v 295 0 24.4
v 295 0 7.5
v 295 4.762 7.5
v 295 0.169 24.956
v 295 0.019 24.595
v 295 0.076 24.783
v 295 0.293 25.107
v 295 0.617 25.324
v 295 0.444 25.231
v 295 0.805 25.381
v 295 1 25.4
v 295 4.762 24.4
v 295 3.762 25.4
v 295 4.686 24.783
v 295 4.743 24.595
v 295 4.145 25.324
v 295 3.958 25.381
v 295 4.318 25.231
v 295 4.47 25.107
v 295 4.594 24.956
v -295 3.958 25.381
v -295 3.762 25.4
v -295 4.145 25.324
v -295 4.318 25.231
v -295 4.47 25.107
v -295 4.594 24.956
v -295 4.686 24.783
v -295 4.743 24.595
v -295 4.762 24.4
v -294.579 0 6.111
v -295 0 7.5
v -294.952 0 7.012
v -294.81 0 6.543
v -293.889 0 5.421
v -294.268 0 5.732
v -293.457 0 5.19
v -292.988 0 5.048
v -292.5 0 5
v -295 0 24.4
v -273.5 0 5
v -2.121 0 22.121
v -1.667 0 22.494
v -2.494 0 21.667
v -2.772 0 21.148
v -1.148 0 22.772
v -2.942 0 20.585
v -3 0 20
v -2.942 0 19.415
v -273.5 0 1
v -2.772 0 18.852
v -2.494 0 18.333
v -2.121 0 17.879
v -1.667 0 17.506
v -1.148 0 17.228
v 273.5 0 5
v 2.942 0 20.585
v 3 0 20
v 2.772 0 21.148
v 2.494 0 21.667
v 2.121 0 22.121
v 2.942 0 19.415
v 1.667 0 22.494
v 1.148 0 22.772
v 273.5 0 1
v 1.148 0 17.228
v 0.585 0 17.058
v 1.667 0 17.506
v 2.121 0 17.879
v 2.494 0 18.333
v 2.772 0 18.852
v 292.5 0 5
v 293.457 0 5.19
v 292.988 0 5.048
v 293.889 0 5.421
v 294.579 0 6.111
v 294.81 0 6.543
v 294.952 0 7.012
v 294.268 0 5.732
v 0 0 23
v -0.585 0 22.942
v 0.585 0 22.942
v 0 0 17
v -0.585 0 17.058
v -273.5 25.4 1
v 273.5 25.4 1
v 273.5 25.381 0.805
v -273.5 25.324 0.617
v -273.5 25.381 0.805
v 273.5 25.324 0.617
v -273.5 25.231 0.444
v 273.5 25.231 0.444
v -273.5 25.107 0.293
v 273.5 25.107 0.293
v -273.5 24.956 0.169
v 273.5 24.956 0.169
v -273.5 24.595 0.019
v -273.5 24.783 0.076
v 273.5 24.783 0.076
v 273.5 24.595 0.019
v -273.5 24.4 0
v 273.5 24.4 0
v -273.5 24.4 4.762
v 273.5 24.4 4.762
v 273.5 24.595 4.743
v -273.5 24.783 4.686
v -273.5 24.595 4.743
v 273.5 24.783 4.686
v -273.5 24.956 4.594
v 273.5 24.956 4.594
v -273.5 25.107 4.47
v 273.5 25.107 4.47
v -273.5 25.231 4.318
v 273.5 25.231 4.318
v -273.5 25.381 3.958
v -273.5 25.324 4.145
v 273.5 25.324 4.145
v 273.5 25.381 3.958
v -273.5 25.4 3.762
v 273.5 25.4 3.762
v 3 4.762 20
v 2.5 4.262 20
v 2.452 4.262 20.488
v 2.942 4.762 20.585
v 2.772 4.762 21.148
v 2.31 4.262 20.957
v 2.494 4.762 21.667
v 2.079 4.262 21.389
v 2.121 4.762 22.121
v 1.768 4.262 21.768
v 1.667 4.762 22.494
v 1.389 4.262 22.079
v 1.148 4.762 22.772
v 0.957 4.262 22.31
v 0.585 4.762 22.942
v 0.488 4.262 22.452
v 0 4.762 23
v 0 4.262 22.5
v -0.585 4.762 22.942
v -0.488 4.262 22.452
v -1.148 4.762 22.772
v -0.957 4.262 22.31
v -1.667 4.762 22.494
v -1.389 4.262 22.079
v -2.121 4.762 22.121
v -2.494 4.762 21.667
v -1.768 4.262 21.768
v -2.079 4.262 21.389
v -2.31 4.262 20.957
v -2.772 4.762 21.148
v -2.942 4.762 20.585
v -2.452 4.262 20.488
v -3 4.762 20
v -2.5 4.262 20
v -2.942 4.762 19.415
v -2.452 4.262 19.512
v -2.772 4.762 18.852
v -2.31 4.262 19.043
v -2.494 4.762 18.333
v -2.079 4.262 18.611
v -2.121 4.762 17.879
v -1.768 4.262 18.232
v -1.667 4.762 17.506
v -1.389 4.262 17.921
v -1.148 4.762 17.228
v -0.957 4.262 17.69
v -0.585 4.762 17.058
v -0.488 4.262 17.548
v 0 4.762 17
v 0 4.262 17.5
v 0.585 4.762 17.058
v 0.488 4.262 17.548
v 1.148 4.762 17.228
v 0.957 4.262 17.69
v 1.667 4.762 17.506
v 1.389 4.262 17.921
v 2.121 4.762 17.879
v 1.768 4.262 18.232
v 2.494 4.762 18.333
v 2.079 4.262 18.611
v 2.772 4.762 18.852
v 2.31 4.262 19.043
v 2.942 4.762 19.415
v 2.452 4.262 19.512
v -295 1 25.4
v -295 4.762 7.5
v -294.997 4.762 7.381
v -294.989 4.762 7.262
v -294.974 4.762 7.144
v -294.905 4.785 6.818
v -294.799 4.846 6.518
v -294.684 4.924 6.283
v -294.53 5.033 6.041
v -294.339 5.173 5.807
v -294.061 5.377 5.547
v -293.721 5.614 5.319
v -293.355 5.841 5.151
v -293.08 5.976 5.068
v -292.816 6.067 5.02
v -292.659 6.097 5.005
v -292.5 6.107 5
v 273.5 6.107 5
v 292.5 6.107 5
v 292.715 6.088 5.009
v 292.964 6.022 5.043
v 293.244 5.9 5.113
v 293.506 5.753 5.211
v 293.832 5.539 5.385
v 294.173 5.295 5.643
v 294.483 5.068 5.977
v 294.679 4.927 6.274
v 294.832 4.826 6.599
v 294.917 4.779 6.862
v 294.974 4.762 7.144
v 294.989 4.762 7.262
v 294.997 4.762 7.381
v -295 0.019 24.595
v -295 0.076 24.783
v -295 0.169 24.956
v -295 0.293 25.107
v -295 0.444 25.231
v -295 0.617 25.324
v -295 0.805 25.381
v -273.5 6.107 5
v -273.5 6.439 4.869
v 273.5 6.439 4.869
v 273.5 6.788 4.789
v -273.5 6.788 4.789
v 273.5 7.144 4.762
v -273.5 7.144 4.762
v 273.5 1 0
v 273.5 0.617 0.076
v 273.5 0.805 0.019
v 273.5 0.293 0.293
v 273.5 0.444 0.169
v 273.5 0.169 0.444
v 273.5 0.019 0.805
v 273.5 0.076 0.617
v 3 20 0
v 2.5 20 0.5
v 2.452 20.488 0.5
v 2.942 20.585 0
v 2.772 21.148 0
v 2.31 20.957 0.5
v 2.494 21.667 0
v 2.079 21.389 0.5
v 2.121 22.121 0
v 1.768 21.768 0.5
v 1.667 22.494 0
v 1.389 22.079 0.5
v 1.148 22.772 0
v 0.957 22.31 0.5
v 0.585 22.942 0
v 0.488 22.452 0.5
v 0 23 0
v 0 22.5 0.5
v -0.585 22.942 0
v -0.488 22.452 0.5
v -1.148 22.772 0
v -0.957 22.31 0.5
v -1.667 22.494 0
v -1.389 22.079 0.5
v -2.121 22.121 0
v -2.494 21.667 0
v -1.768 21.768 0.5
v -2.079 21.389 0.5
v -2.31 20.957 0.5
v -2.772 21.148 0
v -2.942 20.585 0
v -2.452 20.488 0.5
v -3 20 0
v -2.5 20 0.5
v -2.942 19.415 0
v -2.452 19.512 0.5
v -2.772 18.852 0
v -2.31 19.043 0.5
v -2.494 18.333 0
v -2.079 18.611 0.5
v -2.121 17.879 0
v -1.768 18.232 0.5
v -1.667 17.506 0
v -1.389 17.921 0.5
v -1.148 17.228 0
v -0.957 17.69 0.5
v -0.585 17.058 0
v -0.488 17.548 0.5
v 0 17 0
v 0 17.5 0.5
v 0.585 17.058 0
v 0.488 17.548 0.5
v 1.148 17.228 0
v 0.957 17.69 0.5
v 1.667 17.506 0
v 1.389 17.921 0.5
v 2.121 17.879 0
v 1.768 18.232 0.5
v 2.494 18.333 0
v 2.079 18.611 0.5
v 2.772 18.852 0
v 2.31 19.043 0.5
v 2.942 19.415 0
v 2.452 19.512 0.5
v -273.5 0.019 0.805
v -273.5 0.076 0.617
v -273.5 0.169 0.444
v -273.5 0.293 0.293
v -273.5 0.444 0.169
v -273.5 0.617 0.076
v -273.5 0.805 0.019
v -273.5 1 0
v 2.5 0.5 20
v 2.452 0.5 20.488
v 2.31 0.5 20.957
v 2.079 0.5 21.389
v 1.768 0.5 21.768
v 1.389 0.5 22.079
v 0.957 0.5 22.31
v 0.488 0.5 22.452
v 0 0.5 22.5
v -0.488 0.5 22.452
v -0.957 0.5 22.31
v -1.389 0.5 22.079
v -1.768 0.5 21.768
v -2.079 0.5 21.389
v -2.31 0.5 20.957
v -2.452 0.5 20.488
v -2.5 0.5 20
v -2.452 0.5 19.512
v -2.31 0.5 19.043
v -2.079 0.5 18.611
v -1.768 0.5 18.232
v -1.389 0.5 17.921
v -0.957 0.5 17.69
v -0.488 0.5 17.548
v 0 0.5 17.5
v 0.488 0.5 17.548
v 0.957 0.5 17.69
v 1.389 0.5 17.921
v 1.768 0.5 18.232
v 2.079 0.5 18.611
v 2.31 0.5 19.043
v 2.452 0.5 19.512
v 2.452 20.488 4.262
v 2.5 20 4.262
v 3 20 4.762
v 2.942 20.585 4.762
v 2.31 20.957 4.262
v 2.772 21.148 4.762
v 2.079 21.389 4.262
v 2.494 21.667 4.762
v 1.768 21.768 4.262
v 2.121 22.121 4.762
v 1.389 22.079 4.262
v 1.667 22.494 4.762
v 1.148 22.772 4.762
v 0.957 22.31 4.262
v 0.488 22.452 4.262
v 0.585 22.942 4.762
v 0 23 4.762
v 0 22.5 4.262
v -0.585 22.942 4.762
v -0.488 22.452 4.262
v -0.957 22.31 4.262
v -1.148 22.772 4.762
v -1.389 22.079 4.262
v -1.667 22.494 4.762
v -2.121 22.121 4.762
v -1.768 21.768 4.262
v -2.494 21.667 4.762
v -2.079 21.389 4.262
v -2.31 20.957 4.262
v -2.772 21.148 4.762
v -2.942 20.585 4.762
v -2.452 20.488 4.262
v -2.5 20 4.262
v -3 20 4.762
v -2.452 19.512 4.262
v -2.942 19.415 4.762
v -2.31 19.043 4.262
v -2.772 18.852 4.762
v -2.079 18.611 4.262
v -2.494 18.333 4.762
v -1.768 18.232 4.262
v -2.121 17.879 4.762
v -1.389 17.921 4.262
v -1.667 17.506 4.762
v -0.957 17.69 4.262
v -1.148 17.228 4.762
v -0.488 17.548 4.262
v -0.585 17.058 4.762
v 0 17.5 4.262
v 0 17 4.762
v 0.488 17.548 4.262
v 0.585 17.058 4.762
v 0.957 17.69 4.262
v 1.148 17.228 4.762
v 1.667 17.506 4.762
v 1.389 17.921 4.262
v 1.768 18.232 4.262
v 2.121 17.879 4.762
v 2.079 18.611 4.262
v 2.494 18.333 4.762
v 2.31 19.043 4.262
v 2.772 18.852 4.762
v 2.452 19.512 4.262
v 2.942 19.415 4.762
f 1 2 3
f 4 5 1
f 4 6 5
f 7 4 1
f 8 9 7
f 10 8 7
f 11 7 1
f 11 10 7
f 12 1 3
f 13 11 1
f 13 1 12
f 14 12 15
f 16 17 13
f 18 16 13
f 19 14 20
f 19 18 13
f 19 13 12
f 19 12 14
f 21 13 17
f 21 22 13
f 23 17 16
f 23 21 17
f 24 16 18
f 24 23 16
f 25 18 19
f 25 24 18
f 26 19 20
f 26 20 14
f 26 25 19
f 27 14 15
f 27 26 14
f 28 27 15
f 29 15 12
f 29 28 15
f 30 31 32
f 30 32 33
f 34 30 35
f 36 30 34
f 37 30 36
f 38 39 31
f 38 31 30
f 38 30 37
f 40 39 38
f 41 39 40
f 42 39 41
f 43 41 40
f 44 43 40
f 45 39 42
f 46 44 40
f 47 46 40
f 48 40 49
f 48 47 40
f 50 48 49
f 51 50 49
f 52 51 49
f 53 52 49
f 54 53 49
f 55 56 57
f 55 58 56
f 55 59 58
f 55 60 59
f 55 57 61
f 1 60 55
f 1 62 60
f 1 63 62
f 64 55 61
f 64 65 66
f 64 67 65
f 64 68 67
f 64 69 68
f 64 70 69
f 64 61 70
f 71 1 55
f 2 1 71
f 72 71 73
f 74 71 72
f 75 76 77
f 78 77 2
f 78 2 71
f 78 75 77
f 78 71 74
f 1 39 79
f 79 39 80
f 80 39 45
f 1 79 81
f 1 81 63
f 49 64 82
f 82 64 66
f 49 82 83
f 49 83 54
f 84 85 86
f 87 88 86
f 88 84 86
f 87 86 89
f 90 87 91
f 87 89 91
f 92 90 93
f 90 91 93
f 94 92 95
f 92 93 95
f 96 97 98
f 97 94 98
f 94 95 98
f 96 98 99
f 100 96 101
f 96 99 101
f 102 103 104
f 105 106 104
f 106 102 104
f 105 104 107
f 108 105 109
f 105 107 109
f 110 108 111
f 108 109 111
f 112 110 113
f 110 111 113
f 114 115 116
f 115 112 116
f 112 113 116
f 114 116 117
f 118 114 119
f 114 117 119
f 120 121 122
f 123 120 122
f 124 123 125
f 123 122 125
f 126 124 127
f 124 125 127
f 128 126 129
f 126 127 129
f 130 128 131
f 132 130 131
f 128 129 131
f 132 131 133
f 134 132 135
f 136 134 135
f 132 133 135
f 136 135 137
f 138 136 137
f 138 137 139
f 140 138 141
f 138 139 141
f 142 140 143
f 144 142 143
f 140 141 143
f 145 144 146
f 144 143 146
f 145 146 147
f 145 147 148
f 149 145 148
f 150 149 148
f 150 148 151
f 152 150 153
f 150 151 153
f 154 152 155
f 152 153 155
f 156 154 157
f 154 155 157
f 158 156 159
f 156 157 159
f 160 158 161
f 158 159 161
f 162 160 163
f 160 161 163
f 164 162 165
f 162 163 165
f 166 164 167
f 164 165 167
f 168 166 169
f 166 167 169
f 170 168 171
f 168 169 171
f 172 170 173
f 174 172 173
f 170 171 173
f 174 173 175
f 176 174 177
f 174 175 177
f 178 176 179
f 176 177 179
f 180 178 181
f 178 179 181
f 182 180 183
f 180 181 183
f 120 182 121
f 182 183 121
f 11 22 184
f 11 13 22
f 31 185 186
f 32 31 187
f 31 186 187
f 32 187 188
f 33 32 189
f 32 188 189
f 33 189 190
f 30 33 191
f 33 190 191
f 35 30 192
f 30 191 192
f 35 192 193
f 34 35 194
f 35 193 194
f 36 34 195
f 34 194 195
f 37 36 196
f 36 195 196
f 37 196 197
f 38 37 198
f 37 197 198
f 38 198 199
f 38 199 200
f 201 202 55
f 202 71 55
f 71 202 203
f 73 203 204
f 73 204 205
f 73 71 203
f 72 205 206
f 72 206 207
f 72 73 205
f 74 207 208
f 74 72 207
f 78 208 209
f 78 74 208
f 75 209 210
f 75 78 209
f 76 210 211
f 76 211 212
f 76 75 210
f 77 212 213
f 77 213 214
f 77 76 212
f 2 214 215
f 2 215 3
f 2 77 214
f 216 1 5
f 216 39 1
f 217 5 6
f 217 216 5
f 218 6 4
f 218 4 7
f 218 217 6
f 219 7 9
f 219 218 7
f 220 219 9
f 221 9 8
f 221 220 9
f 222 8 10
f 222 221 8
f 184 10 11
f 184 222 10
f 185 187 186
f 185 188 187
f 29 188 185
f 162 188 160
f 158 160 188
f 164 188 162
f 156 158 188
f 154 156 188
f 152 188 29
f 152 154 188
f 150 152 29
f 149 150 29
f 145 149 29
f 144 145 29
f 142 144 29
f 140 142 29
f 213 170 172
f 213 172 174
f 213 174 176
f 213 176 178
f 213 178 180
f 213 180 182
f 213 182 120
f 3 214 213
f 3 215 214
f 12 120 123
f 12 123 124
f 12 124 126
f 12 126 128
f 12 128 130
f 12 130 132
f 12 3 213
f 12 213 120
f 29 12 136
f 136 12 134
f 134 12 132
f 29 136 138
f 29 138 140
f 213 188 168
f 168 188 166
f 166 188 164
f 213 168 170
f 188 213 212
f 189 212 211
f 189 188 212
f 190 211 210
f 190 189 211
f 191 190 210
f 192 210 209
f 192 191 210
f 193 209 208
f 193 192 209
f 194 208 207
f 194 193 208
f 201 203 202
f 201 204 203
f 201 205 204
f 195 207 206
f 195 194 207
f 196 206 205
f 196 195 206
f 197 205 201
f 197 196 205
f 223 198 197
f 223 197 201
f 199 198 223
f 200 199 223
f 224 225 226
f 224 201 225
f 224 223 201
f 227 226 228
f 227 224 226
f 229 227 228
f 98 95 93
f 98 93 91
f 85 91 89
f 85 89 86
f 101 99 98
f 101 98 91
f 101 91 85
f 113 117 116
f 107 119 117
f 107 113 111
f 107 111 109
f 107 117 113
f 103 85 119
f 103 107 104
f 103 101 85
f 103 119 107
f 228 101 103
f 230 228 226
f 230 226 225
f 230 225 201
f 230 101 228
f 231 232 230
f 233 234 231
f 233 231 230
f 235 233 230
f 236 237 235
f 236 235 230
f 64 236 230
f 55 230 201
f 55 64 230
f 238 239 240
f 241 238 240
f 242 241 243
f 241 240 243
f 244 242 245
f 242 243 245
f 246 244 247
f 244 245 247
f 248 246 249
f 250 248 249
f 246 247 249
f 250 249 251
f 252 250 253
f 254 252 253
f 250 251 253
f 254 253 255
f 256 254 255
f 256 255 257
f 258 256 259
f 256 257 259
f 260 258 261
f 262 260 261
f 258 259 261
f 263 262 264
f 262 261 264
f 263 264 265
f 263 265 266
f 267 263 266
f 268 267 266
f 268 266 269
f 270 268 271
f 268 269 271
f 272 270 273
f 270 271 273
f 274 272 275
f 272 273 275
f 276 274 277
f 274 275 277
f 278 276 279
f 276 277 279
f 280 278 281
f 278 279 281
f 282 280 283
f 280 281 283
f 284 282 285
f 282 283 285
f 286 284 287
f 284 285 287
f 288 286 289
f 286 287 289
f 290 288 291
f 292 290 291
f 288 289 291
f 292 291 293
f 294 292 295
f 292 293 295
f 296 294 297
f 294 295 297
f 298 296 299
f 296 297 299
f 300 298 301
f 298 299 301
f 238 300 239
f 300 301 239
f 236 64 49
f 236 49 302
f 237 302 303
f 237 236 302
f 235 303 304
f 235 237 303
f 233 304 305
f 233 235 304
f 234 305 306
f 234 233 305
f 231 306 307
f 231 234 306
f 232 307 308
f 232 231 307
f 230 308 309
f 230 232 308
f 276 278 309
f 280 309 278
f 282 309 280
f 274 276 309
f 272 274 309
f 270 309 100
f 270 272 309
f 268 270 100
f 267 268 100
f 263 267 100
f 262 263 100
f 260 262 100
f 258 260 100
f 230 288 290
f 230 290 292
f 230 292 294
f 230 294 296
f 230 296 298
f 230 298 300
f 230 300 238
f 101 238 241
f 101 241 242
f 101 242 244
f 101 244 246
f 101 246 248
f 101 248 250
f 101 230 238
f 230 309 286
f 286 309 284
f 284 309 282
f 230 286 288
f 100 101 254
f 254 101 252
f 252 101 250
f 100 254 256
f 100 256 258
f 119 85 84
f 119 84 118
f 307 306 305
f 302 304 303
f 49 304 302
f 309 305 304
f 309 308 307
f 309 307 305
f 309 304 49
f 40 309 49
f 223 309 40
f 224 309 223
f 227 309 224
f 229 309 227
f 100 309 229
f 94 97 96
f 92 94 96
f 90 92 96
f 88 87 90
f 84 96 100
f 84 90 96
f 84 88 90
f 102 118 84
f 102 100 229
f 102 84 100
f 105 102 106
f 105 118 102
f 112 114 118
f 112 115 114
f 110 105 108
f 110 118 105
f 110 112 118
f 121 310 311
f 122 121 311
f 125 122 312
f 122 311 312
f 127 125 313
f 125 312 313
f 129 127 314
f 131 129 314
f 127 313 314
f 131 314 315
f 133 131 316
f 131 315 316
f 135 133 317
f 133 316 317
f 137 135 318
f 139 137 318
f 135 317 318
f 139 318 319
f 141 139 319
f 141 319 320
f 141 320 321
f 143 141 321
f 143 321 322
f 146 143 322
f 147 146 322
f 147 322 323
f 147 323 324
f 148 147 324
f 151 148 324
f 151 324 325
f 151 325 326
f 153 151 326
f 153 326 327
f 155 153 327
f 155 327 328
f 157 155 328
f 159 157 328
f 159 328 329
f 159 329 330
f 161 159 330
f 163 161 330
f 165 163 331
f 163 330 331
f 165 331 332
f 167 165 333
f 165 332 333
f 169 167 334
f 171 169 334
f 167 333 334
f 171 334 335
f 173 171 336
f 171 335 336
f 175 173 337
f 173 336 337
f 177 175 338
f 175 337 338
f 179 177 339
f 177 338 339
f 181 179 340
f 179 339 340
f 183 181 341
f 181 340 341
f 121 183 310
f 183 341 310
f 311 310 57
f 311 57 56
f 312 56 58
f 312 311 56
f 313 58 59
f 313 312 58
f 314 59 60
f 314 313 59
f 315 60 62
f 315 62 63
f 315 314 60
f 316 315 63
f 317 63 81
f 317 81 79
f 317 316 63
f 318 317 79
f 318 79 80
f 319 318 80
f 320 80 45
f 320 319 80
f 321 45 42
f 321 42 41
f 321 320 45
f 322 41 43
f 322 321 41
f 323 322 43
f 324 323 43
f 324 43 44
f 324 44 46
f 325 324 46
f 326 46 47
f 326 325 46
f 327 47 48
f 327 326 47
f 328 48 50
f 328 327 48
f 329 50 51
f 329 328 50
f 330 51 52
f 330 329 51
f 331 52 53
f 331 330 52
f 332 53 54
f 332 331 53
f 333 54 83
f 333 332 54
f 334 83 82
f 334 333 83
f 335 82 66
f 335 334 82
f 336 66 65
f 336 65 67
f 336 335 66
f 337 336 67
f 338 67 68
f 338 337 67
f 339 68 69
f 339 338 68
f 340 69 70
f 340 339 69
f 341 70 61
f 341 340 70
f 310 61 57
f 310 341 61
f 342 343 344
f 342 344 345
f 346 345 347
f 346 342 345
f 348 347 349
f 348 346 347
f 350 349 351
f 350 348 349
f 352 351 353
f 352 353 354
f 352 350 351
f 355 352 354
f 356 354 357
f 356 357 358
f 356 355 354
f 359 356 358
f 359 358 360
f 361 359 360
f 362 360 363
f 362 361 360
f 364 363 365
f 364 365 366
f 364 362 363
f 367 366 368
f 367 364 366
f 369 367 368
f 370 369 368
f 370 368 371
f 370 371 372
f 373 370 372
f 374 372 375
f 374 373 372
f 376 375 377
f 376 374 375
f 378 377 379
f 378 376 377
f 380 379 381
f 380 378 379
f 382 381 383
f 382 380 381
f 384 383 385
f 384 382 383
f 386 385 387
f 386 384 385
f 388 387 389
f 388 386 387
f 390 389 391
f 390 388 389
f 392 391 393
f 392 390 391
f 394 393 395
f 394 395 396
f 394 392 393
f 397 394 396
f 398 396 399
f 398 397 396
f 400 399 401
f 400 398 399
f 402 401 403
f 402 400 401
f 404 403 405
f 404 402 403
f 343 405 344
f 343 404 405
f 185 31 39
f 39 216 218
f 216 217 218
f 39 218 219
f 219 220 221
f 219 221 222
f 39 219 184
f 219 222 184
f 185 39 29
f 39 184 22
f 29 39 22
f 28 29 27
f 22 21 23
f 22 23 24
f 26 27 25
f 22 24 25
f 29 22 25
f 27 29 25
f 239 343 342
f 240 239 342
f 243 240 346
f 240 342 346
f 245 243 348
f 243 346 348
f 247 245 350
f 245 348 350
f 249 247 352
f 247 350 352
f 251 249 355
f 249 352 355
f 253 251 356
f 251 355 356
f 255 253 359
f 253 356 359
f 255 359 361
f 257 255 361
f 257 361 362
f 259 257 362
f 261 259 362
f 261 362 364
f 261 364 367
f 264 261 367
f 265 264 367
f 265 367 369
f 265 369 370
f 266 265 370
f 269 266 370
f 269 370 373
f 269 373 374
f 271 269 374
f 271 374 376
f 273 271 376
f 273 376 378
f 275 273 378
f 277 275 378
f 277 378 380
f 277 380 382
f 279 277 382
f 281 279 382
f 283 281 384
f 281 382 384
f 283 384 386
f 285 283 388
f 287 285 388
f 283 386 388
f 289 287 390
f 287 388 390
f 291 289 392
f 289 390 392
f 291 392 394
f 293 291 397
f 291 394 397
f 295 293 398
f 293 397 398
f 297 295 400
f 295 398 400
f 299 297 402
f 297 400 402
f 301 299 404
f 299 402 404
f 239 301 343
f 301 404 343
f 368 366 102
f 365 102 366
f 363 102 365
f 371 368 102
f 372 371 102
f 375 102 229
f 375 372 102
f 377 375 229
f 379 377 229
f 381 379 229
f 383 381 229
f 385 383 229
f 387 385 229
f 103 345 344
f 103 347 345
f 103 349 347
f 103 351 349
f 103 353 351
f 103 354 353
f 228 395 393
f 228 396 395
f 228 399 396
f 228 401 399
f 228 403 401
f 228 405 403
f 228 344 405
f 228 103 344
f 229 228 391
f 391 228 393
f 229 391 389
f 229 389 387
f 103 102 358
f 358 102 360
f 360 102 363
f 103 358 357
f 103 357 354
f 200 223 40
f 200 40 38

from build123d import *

# Parameters (mm, degrees)
F1_DEPTH  = 295
F2_R      = 1
F3_R      = 2.38125
F5_W      = 50
F5_H      = 50
F6_DEPTH  = 25
F7_R      = 2.5
F8_R      = 2.5
F9_DEPTH  = 25
F10_SIZE  = 0.5
F11_R     = 2.5
F12_DEPTH = 25
F13_SIZE  = 0.5


with BuildPart() as f1:
    # F0 (on Right) → F1 (new body, symmetric)
    with BuildSketch(Plane.YZ):
        Polygon((0, 25.4), (0, 0), (25.4, 0), (25.4, 4.7625), (4.7625, 4.7625), (4.7625, 25.4), align=None)
    extrude(amount=F1_DEPTH, both=True)

    # F2
    f2_edges = [f1.edges().sort_by_distance(p)[0] for p in [
        (0, 0, 25.4),
        (0, 4.7625, 25.4),
        (0, 0, 0),
        (0, 25.4, 4.7625),
        (0, 25.4, 0),
    ]]
    fillet(f2_edges, radius=F2_R)

    # F3
    f3_edges = [f1.edges().sort_by_distance(p)[0] for p in [
        (0, 4.7625, 4.7625),
    ]]
    fillet(f3_edges, radius=F3_R)

    # F5 (on face) → F6 (cut, symmetric)
    with BuildSketch(Plane(origin=(0, 4.7625, 0), x_dir=(-1, 0, 0), z_dir=(0, 1, 0))):
        with Locations((-298.5, -20)):
            Rectangle(F5_W, F5_H)
        with Locations((298.5, -20)):
            Rectangle(F5_W, F5_H)
    extrude(amount=F6_DEPTH, both=True, mode=Mode.SUBTRACT)

    # F7
    f7_edges = [f1.edges().sort_by_distance(p)[0] for p in [
        (295, 3.053539, 5),
        (-295, 3.053539, 5),
    ]]
    fillet(f7_edges, radius=F7_R)

    # F8 (on face) → F9 (cut)
    with BuildSketch(Plane.XY.offset(4.7625)):
        with Locations((0, 20)):
            Circle(F8_R)
    extrude(amount=-F9_DEPTH, mode=Mode.SUBTRACT)

    # F10
    f10_edges = [f1.edges().sort_by_distance(p)[0] for p in [
        (-2.5, 20, 4.7625),
        (2.5, 20, 2.38125),
        (-2.5, 20, 0),
    ]]
    chamfer(f10_edges, length=F10_SIZE)

    # F11 (on face) → F12 (cut)
    with BuildSketch(Plane.XZ):
        with Locations((0, 20)):
            Circle(F11_R)
    extrude(amount=-F12_DEPTH, mode=Mode.SUBTRACT)

    # F13
    f13_edges = [f1.edges().sort_by_distance(p)[0] for p in [
        (-2.5, 0, 20),
        (2.5, 2.38125, 20),
        (-2.5, 4.7625, 20),
    ]]
    chamfer(f13_edges, length=F13_SIZE)


solid = f1.part
